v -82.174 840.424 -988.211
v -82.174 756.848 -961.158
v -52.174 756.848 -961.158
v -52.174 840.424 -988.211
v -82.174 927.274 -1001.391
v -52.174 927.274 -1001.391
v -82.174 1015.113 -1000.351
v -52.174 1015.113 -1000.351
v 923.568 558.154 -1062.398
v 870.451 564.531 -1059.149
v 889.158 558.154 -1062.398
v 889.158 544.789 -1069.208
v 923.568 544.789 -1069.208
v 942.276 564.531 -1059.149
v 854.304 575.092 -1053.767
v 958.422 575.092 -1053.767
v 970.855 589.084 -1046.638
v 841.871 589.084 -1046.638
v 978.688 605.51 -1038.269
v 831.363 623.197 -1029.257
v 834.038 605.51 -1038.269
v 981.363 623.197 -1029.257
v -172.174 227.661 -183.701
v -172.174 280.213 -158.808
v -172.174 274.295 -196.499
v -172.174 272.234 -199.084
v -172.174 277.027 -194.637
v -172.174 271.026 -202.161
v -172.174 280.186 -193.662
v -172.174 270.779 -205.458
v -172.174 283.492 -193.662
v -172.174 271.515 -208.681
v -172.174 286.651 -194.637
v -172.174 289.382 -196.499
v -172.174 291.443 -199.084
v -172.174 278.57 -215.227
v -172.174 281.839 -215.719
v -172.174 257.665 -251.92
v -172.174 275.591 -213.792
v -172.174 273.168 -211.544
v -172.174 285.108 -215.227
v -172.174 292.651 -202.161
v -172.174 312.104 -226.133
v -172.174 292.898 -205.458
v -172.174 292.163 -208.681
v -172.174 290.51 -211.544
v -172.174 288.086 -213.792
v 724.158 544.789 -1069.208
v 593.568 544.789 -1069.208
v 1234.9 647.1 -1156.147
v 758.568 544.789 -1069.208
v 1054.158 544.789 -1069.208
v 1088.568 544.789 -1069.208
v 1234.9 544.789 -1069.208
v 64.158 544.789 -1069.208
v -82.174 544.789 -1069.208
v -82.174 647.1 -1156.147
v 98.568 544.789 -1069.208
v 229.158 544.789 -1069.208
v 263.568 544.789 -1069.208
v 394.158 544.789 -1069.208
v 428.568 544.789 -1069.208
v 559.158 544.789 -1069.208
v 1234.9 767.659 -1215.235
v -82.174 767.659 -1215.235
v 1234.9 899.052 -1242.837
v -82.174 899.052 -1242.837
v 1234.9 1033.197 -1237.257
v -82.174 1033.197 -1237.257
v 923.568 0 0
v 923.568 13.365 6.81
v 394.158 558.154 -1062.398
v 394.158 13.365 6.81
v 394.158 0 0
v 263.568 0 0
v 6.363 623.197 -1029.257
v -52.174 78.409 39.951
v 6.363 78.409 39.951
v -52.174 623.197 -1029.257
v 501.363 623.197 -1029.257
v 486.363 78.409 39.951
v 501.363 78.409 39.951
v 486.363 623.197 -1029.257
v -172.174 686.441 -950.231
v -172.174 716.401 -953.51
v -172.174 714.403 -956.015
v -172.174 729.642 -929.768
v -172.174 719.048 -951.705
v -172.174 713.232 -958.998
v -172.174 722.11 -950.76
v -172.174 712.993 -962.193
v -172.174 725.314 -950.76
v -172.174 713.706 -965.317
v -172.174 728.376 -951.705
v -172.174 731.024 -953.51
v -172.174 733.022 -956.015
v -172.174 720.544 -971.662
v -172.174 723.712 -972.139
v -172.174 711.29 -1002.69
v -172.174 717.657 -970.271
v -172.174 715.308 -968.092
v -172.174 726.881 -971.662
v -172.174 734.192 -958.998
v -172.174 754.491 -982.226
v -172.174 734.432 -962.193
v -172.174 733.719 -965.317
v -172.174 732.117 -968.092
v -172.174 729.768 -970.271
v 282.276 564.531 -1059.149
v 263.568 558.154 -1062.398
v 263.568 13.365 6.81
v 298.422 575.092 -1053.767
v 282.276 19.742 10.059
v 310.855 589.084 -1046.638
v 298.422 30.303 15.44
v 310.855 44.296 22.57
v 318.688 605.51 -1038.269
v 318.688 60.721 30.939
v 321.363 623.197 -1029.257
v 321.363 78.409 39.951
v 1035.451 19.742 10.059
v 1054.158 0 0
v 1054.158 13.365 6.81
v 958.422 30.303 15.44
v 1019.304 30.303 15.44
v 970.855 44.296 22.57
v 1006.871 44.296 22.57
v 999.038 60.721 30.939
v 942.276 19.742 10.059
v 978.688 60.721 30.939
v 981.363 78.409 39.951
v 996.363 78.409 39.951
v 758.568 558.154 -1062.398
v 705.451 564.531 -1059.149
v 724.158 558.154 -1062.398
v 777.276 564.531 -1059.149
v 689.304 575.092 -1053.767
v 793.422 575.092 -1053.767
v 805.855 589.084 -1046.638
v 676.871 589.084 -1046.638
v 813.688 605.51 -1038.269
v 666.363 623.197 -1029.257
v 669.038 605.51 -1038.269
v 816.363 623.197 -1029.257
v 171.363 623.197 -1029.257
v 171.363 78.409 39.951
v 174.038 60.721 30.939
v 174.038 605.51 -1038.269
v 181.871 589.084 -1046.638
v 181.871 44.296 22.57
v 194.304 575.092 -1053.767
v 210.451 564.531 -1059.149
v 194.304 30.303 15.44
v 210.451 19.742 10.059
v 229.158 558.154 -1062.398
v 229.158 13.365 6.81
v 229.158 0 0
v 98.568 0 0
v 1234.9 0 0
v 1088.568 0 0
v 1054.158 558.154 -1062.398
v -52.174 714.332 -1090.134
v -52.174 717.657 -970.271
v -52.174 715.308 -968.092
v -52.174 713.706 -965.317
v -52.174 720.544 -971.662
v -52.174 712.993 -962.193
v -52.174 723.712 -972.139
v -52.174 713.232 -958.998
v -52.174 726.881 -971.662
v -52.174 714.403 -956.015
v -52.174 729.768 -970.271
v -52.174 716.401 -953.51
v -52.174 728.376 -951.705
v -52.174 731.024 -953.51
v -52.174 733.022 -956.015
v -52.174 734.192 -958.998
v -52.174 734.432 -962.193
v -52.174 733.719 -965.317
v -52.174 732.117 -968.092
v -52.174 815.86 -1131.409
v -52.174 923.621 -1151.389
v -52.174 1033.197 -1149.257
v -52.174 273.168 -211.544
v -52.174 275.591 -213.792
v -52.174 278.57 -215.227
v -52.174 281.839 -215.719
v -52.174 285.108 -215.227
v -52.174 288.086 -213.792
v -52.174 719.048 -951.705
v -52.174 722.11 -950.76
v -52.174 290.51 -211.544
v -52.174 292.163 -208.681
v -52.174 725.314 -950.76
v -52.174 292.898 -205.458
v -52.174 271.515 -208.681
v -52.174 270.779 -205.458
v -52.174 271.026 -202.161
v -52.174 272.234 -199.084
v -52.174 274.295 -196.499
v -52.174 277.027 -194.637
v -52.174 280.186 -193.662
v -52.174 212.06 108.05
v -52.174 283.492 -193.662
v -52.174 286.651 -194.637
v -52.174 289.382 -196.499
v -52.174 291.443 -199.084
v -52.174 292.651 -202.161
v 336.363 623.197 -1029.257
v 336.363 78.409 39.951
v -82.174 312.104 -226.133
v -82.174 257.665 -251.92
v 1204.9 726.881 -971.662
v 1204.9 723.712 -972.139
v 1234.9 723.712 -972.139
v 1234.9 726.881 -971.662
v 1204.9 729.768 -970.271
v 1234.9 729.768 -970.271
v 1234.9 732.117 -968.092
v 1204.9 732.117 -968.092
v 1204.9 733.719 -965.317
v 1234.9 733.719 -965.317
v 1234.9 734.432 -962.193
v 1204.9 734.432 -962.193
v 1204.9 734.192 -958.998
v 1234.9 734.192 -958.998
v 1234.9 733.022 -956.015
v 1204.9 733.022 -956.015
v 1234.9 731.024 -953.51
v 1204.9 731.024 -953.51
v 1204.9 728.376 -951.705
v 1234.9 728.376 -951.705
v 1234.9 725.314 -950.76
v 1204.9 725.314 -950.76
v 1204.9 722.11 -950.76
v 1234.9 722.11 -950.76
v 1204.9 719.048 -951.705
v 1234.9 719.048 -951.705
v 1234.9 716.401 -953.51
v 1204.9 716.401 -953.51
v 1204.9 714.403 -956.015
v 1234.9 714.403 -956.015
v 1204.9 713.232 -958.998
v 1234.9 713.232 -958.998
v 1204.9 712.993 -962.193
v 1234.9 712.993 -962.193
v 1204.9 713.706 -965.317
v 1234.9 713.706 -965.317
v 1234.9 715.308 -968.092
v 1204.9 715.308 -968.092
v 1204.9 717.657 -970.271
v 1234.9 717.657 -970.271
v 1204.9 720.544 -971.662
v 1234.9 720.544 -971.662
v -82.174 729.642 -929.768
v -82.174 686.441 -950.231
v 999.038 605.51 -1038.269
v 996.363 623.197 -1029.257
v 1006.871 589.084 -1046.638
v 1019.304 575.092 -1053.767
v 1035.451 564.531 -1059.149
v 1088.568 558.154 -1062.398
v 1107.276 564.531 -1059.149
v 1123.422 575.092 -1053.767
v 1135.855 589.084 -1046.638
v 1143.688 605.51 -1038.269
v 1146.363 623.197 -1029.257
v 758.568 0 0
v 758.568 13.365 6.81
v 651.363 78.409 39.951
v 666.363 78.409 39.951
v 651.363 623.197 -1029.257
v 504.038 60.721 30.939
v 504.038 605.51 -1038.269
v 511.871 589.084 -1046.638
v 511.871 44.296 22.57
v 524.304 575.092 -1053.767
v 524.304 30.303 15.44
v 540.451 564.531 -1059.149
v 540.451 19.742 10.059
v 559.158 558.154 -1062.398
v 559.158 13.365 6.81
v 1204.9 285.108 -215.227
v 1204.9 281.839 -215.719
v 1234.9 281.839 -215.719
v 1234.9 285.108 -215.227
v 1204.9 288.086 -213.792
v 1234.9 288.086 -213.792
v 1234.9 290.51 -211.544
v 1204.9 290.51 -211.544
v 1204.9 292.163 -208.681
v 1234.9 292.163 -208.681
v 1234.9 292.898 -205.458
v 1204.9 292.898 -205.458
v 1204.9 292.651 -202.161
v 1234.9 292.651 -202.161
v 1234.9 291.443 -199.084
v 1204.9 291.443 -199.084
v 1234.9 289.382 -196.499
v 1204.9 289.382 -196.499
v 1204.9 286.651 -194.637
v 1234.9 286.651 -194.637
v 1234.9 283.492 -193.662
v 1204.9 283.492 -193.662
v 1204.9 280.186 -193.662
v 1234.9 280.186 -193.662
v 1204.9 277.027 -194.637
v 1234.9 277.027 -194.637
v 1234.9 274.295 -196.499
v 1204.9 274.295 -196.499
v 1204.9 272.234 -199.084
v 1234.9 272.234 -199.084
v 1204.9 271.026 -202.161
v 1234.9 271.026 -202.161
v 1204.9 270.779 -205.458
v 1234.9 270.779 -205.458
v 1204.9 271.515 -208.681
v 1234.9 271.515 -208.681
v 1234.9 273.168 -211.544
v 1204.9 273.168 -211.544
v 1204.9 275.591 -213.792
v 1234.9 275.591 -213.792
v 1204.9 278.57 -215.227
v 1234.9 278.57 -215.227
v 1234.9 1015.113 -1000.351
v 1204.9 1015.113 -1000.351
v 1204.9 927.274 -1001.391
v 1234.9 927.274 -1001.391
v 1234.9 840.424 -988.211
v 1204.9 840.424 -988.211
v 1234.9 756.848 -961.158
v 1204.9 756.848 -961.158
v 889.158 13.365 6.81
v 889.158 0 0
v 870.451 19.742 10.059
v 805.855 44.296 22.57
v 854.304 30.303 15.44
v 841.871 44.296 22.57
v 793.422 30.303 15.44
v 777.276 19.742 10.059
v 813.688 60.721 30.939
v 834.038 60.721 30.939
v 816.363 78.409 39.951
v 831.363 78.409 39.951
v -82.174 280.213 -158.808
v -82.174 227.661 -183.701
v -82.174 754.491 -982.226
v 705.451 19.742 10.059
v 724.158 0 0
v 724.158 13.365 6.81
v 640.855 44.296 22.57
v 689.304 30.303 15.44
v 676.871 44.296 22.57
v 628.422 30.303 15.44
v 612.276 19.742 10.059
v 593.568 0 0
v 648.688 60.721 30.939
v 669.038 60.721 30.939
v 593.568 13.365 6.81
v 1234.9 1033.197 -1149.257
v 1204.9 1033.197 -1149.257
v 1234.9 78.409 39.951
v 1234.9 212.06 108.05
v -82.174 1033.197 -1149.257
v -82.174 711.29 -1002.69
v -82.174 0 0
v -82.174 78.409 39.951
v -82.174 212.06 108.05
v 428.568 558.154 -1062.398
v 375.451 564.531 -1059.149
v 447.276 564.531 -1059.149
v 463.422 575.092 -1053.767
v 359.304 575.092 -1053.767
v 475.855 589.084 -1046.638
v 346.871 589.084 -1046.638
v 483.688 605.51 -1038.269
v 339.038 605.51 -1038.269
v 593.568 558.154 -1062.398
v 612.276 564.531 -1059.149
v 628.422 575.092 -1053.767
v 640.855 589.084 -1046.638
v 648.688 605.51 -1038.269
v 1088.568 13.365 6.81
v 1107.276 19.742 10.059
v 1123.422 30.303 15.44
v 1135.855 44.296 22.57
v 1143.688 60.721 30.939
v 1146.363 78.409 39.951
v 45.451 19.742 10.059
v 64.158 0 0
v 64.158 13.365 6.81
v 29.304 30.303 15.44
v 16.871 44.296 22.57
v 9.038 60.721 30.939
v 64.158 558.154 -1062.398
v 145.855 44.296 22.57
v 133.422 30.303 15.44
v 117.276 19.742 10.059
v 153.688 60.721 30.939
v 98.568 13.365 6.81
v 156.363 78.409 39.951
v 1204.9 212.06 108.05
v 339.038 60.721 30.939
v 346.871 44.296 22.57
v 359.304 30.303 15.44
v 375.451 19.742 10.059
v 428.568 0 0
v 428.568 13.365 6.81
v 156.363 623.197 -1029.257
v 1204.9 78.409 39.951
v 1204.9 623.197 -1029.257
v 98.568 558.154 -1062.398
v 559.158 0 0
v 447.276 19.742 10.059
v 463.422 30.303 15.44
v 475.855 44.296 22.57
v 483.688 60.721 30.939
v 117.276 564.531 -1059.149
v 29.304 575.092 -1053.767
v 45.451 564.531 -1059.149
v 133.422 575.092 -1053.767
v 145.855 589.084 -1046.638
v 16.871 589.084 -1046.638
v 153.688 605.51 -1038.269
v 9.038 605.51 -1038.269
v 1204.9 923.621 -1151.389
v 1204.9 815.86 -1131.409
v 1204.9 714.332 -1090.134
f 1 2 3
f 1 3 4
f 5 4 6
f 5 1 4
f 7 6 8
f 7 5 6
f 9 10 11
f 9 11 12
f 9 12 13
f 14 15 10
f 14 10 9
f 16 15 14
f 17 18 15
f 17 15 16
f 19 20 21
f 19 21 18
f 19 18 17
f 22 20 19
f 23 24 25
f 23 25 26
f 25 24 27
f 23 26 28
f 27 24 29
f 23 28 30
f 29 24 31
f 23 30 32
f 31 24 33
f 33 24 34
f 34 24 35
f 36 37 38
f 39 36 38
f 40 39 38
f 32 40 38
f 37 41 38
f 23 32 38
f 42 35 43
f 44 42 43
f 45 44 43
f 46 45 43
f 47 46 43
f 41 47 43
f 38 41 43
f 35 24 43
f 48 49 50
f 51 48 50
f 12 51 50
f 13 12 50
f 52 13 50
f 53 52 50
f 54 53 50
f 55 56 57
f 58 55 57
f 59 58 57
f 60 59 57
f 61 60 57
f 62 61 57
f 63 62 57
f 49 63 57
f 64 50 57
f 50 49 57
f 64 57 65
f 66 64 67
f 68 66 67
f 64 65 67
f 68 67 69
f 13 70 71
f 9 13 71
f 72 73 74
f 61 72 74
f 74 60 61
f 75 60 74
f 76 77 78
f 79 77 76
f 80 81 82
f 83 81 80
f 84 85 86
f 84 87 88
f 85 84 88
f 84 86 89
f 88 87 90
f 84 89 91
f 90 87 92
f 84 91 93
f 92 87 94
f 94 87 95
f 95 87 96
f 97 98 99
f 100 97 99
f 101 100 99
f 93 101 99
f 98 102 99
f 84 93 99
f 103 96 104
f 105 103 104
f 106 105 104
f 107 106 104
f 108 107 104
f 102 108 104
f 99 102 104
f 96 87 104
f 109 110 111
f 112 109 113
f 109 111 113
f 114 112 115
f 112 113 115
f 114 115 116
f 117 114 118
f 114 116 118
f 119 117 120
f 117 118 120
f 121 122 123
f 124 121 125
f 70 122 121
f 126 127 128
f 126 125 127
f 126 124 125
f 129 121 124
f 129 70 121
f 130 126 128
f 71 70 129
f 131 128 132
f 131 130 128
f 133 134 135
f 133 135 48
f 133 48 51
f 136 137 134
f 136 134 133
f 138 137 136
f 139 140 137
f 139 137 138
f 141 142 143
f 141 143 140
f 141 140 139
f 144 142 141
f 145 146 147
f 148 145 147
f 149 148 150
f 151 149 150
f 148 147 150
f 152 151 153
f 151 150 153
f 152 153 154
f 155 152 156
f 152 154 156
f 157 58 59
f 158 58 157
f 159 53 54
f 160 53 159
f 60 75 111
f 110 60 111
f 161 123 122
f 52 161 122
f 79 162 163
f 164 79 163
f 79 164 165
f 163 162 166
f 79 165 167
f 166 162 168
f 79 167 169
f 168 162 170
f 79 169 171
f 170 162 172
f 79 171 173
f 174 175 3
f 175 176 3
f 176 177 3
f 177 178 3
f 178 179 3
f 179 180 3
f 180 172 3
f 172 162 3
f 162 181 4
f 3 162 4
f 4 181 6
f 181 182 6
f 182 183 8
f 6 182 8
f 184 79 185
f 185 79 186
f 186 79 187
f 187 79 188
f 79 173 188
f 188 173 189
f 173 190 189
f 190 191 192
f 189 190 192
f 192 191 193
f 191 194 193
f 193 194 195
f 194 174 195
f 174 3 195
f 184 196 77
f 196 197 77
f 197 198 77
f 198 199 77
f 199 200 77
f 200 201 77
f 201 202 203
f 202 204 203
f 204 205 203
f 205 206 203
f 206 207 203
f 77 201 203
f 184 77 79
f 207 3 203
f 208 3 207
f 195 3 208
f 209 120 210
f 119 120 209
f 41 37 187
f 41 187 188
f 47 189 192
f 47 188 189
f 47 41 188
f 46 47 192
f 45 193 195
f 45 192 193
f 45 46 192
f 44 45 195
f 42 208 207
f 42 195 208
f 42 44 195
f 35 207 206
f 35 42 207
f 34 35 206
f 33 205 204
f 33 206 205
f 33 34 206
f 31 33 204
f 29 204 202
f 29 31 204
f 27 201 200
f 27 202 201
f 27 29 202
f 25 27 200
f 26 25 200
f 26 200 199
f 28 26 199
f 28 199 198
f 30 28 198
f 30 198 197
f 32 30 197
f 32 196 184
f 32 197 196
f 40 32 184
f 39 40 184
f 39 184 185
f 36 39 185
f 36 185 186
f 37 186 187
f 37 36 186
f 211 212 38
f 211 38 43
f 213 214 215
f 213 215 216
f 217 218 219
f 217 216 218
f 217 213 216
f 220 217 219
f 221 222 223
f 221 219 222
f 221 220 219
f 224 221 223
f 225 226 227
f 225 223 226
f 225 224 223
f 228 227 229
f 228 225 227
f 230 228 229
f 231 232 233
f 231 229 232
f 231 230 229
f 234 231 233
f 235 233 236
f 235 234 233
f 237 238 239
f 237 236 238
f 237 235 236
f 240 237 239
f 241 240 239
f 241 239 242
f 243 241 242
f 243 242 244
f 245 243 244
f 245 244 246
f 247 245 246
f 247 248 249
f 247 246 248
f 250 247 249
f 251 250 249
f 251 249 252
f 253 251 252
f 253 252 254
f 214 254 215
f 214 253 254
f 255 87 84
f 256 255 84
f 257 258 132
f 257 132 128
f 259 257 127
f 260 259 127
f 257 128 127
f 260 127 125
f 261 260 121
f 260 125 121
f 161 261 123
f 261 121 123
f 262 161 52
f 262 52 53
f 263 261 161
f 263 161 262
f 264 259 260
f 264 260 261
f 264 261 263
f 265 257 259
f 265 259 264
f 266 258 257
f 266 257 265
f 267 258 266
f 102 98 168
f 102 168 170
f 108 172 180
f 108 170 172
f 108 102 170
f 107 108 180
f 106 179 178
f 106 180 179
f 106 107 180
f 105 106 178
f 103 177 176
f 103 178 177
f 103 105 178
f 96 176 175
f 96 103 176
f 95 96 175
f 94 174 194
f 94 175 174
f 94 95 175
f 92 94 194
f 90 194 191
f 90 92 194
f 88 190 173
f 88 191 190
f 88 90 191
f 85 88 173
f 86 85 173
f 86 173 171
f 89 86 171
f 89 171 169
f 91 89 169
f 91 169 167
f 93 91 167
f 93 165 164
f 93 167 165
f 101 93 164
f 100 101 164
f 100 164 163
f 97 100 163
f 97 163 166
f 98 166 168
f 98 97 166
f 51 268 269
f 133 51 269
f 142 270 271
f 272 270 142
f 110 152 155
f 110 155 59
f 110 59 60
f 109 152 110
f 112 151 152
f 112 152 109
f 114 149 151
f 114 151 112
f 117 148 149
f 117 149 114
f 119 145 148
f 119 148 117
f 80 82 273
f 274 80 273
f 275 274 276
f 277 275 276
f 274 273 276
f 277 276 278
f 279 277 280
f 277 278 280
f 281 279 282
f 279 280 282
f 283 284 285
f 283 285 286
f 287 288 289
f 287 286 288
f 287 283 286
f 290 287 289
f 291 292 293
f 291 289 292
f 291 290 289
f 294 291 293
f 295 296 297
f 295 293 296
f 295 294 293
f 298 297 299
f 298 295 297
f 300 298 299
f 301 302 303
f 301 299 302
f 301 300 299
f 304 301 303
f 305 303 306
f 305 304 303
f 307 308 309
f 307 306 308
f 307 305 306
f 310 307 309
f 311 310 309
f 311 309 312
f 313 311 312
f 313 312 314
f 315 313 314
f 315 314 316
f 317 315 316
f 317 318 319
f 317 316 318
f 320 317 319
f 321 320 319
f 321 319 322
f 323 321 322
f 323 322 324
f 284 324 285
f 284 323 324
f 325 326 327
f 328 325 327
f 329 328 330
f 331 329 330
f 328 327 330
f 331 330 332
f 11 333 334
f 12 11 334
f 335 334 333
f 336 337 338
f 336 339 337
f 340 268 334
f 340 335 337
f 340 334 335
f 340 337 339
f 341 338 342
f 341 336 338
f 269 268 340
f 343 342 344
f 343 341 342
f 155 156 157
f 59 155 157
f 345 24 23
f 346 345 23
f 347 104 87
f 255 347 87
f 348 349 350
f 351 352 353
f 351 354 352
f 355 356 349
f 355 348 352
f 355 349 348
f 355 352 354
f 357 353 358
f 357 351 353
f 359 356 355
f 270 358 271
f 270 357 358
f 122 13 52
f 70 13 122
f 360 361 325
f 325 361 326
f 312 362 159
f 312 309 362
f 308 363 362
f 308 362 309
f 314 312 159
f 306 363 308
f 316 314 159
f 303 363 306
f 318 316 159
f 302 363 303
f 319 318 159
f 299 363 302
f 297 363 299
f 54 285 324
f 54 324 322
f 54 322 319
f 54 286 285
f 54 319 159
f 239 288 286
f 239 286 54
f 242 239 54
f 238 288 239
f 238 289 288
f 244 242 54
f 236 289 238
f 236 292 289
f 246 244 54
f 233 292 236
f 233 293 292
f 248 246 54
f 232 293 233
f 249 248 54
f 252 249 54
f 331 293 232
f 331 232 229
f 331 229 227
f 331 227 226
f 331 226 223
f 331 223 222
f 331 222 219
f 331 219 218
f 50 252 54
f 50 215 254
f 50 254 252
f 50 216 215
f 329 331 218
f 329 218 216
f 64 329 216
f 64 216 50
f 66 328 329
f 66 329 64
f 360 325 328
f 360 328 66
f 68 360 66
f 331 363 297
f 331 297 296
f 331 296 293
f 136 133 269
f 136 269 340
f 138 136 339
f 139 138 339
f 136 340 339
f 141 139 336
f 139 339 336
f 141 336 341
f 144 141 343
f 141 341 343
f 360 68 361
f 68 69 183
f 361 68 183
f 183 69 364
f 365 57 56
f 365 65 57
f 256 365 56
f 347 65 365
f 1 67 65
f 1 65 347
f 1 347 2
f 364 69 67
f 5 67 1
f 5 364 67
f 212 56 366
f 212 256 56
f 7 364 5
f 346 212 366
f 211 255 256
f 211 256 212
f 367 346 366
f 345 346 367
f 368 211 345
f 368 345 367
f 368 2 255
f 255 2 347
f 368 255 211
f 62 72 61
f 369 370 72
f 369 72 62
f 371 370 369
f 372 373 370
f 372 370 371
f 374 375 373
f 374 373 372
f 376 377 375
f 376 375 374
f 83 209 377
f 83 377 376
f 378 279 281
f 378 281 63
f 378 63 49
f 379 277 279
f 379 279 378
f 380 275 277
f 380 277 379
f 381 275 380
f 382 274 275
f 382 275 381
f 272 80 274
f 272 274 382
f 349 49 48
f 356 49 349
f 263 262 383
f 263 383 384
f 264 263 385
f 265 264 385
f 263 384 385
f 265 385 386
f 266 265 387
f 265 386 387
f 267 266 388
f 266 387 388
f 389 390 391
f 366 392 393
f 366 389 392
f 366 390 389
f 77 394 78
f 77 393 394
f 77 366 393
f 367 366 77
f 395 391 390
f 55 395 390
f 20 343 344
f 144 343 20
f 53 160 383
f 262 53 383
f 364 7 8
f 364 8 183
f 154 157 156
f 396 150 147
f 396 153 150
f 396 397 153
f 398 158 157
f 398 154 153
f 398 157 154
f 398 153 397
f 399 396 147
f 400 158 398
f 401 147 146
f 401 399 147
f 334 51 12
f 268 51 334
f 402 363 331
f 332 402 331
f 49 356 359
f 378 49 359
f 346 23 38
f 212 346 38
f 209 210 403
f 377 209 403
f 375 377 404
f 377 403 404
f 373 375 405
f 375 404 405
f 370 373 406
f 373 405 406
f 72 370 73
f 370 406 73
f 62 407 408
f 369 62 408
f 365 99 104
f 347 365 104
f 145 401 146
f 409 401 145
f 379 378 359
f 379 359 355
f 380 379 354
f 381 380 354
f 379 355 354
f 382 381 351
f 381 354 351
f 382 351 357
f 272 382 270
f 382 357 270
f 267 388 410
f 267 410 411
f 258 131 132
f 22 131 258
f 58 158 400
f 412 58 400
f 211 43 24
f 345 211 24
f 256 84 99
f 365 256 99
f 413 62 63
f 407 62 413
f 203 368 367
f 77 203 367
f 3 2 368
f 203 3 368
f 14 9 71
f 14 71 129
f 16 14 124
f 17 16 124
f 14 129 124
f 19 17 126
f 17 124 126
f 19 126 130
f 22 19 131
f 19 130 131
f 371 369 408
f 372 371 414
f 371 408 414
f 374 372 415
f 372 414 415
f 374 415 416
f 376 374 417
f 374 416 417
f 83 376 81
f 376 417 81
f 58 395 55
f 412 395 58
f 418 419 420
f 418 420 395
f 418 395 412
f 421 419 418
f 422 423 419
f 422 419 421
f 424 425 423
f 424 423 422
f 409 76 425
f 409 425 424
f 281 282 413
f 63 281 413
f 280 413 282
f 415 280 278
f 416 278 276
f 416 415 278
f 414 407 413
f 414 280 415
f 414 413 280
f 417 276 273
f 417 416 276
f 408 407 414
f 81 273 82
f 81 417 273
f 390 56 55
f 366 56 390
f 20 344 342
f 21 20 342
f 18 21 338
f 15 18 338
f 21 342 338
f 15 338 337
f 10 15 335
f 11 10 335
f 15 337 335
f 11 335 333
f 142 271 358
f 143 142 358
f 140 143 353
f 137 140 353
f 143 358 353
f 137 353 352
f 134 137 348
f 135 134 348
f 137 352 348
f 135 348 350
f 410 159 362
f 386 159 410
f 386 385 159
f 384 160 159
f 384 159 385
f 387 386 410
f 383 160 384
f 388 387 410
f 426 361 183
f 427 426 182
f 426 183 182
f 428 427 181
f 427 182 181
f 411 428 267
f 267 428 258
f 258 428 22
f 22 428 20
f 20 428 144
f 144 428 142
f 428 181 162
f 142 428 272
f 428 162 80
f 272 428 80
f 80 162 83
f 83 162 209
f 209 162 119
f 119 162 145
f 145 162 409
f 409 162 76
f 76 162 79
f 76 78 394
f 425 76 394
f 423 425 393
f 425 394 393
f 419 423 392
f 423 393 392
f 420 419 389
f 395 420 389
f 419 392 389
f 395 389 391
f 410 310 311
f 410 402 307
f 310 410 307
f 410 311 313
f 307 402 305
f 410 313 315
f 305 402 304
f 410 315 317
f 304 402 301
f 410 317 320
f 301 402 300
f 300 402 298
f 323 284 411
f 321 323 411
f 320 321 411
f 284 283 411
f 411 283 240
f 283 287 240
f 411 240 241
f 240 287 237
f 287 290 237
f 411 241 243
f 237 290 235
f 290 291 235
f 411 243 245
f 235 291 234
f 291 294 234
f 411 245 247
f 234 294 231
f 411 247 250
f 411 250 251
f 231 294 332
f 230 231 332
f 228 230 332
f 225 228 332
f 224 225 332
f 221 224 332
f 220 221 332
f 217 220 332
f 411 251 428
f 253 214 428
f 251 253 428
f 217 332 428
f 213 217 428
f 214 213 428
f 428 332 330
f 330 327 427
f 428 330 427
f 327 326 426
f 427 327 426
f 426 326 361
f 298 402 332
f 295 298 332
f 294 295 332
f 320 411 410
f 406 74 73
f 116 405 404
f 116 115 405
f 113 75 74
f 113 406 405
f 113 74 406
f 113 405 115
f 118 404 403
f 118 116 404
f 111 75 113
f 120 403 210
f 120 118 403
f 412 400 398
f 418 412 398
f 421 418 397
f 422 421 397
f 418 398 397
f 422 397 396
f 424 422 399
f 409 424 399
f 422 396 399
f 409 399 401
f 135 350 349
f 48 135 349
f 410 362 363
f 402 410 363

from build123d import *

# Parameters (mm, degrees)
BOSS_EXTRUDE1_DEPTH      = 1234.900343145
BOSS_EXTRUDE1_DEPTH_BACK = 82.174065831
CUT_EXTRUDE1_DEPTH       = 1200
BOSS_EXTRUDE2_DEPTH      = 30
BOSS_EXTRUDE3_DEPTH      = 30
BOSS_EXTRUDE4_START      = -30
BOSS_EXTRUDE4_DEPTH      = 30
BOSS_EXTRUDE5_DEPTH      = 30
BOSS_EXTRUDE6_DEPTH      = 90
CUT_EXTRUDE2_DEPTH       = 1710
CUT_EXTRUDE2_DEPTH_BACK  = 1710
SKETCH12_R               = 11.090448241
SKETCH12_R_2             = 10.749574141


with BuildPart() as part:
    # Sketch1 → Boss-Extrude1 (new, two sides: drawn at the far end of the back side and taken through both)
    with BuildSketch(Plane(origin=(0, 0, 0), x_dir=(0, 0, -1), z_dir=(1, 0, 0)).offset(-BOSS_EXTRUDE1_DEPTH_BACK)):
        with BuildLine():
            Line((-39.951163977, 78.408574129), (0, 0))
            Line((0, 0), (1069.207829026, 544.788599687))
            ThreePointArc((1069.207829026, 544.788599687), (1215.235027559, 767.659323729), (1237.256665049, 1033.197173816))
            Line((1237.256665049, 1033.197173816), (1149.256665049, 1033.197173816))
            ThreePointArc((1149.256665049, 1033.197173816), (1131.408548141, 815.860037301), (1029.256665049, 623.197173816))
            Line((1029.256665049, 623.197173816), (-39.951163977, 78.408574129))
        make_face()
    extrude(amount=BOSS_EXTRUDE1_DEPTH + BOSS_EXTRUDE1_DEPTH_BACK)

    # Sketch2 → Cut-Extrude1 (cut)
    with BuildSketch(Plane(origin=(0, 0, 0), x_dir=(1, 0, 0), z_dir=(0, -0.45399049973954786, 0.8910065241883673))):
        with BuildLine():
            Line((651.363138657, 88), (501.363138657, 88))
            ThreePointArc((501.363138657, 88), (517.561145536, 41.445455593), (559.158488123, 15))
            Line((559.158488123, 15), (559.158488123, 0))
            Line((559.158488123, 0), (593.567789191, 0))
            Line((593.567789191, 0), (593.567789191, 15))
            ThreePointArc((593.567789191, 15), (635.165131778, 41.445455593), (651.363138657, 88))
        make_face()
        with BuildLine():
            ThreePointArc((428.567789191, 15), (470.165131778, 41.445455593), (486.363138657, 88))
            Line((486.363138657, 88), (336.363138657, 88))
            ThreePointArc((336.363138657, 88), (352.561145536, 41.445455593), (394.158488123, 15))
            Line((394.158488123, 15), (394.158488123, 0))
            Line((394.158488123, 0), (428.567789191, 0))
            Line((428.567789191, 0), (428.567789191, 15))
        make_face()
        with BuildLine():
            Line((816.363138657, 88), (666.363138657, 88))
            ThreePointArc((666.363138657, 88), (682.561145536, 41.445455593), (724.158488123, 15))
            Line((724.158488123, 15), (724.158488123, 0))
            Line((724.158488123, 0), (758.567789191, 0))
            Line((758.567789191, 0), (758.567789191, 15))
            ThreePointArc((758.567789191, 15), (800.165131778, 41.445455593), (816.363138657, 88))
        make_face()
        with BuildLine():
            ThreePointArc((263.567789191, 15), (305.165131778, 41.445455593), (321.363138657, 88))
            Line((321.363138657, 88), (171.363138657, 88))
            ThreePointArc((171.363138657, 88), (187.561145536, 41.445455593), (229.158488123, 15))
            Line((229.158488123, 15), (229.158488123, 0))
            Line((229.158488123, 0), (263.567789191, 0))
            Line((263.567789191, 0), (263.567789191, 15))
        make_face()
        with BuildLine():
            Line((981.363138657, 88), (831.363138657, 88))
            ThreePointArc((831.363138657, 88), (847.561145536, 41.445455593), (889.158488123, 15))
            Line((889.158488123, 15), (889.158488123, 0))
            Line((889.158488123, 0), (923.567789191, 0))
            Line((923.567789191, 0), (923.567789191, 15))
            ThreePointArc((923.567789191, 15), (965.165131778, 41.445455593), (981.363138657, 88))
        make_face()
        with BuildLine():
            ThreePointArc((98.567789191, 15), (140.165131778, 41.445455593), (156.363138657, 88))
            Line((156.363138657, 88), (6.363138657, 88))
            ThreePointArc((6.363138657, 88), (22.561145536, 41.445455593), (64.158488123, 15))
            Line((64.158488123, 15), (64.158488123, 0))
            Line((64.158488123, 0), (98.567789191, 0))
            Line((98.567789191, 0), (98.567789191, 15))
        make_face()
        with BuildLine():
            Line((1146.363138657, 88), (996.363138657, 88))
            ThreePointArc((996.363138657, 88), (1012.561145536, 41.445455593), (1054.158488123, 15))
            Line((1054.158488123, 15), (1054.158488123, 0))
            Line((1054.158488123, 0), (1088.567789191, 0))
            Line((1088.567789191, 0), (1088.567789191, 15))
            ThreePointArc((1088.567789191, 15), (1130.165131778, 41.445455593), (1146.363138657, 88))
        make_face()
    extrude(amount=-CUT_EXTRUDE1_DEPTH, mode=Mode.SUBTRACT)

    # Sketch3 → Boss-Extrude2 (add)
    with BuildSketch(Plane(origin=(1234.900343145, 0, 0), x_dir=(0, 0, -1), z_dir=(1, 0, 0))):
        Polygon((-39.951163977, 78.408574129), (-108.049738938, 212.059552757), (961.158090088, 756.848152444), (1029.256665049, 623.197173816), align=None)
    extrude(amount=-BOSS_EXTRUDE2_DEPTH)

    # Sketch6 → Boss-Extrude3 (add)
    with BuildSketch(Plane.ZY.offset(82.174065831)):
        Polygon((-1029.256665049, 623.197173816), (-961.158090088, 756.848152444), (108.049738938, 212.059552757), (39.951163977, 78.408574129), align=None)
    extrude(amount=-BOSS_EXTRUDE3_DEPTH)

    # Sketch9 → Boss-Extrude4 (add)
    with BuildSketch(Plane(origin=(1234.900343145, 0, 0), x_dir=(0, 0, -1), z_dir=(1, 0, 0)).offset(BOSS_EXTRUDE4_START)):
        with BuildLine():
            Line((1149.256665049, 1033.197173816), (1000.350769421, 1015.113085582))
            ThreePointArc((1000.350769421, 1015.113085582), (996.565266489, 883.581264805), (961.158090088, 756.848152444))
            Line((961.158090088, 756.848152444), (1029.256665049, 623.197173816))
            ThreePointArc((1029.256665049, 623.197173816), (1131.408548141, 815.860037301), (1149.256665049, 1033.197173816))
        make_face()
    extrude(amount=BOSS_EXTRUDE4_DEPTH)

    # Sketch10 → Boss-Extrude5 (add)
    with BuildSketch(Plane.ZY.offset(82.174065831)):
        with BuildLine():
            Line((-1029.256665049, 623.197173816), (-961.158090088, 756.848152444))
            ThreePointArc((-961.158090088, 756.848152444), (-996.565266489, 883.581264805), (-1000.350769421, 1015.113085582))
            Line((-1000.350769421, 1015.113085582), (-1149.256665049, 1033.197173816))
            ThreePointArc((-1149.256665049, 1033.197173816), (-1131.408548141, 815.860037301), (-1029.256665049, 623.197173816))
        make_face()
    extrude(amount=-BOSS_EXTRUDE5_DEPTH)

    # Sketch11 → Boss-Extrude6 (add)
    with BuildSketch(Plane.ZY.offset(82.174065831)):
        Polygon((-982.226090398, 754.490949456), (-929.767856808, 729.642312493), (-950.23144019, 686.441414242), (-1002.68967378, 711.290051206), align=None)
        Polygon((-226.133327046, 312.103551466), (-158.807904246, 280.212561719), (-183.700784796, 227.660925002), (-251.919927814, 257.665172066), align=None)
    extrude(amount=BOSS_EXTRUDE6_DEPTH)

    # Sketch12 → Cut-Extrude2 (cut, two sides: drawn at the far end of the back side and taken through both)
    with BuildSketch(Plane(origin=(1234.900343145, 0, 0), x_dir=(0, 0, -1), z_dir=(1, 0, 0)).offset(-CUT_EXTRUDE2_DEPTH_BACK)):
        with Locations((204.62902054, 281.838763818)):
            Circle(SKETCH12_R)
        with Locations((961.389588636, 723.712275526)):
            Circle(SKETCH12_R_2)
    extrude(amount=CUT_EXTRUDE2_DEPTH + CUT_EXTRUDE2_DEPTH_BACK, mode=Mode.SUBTRACT)


solid = part.part
